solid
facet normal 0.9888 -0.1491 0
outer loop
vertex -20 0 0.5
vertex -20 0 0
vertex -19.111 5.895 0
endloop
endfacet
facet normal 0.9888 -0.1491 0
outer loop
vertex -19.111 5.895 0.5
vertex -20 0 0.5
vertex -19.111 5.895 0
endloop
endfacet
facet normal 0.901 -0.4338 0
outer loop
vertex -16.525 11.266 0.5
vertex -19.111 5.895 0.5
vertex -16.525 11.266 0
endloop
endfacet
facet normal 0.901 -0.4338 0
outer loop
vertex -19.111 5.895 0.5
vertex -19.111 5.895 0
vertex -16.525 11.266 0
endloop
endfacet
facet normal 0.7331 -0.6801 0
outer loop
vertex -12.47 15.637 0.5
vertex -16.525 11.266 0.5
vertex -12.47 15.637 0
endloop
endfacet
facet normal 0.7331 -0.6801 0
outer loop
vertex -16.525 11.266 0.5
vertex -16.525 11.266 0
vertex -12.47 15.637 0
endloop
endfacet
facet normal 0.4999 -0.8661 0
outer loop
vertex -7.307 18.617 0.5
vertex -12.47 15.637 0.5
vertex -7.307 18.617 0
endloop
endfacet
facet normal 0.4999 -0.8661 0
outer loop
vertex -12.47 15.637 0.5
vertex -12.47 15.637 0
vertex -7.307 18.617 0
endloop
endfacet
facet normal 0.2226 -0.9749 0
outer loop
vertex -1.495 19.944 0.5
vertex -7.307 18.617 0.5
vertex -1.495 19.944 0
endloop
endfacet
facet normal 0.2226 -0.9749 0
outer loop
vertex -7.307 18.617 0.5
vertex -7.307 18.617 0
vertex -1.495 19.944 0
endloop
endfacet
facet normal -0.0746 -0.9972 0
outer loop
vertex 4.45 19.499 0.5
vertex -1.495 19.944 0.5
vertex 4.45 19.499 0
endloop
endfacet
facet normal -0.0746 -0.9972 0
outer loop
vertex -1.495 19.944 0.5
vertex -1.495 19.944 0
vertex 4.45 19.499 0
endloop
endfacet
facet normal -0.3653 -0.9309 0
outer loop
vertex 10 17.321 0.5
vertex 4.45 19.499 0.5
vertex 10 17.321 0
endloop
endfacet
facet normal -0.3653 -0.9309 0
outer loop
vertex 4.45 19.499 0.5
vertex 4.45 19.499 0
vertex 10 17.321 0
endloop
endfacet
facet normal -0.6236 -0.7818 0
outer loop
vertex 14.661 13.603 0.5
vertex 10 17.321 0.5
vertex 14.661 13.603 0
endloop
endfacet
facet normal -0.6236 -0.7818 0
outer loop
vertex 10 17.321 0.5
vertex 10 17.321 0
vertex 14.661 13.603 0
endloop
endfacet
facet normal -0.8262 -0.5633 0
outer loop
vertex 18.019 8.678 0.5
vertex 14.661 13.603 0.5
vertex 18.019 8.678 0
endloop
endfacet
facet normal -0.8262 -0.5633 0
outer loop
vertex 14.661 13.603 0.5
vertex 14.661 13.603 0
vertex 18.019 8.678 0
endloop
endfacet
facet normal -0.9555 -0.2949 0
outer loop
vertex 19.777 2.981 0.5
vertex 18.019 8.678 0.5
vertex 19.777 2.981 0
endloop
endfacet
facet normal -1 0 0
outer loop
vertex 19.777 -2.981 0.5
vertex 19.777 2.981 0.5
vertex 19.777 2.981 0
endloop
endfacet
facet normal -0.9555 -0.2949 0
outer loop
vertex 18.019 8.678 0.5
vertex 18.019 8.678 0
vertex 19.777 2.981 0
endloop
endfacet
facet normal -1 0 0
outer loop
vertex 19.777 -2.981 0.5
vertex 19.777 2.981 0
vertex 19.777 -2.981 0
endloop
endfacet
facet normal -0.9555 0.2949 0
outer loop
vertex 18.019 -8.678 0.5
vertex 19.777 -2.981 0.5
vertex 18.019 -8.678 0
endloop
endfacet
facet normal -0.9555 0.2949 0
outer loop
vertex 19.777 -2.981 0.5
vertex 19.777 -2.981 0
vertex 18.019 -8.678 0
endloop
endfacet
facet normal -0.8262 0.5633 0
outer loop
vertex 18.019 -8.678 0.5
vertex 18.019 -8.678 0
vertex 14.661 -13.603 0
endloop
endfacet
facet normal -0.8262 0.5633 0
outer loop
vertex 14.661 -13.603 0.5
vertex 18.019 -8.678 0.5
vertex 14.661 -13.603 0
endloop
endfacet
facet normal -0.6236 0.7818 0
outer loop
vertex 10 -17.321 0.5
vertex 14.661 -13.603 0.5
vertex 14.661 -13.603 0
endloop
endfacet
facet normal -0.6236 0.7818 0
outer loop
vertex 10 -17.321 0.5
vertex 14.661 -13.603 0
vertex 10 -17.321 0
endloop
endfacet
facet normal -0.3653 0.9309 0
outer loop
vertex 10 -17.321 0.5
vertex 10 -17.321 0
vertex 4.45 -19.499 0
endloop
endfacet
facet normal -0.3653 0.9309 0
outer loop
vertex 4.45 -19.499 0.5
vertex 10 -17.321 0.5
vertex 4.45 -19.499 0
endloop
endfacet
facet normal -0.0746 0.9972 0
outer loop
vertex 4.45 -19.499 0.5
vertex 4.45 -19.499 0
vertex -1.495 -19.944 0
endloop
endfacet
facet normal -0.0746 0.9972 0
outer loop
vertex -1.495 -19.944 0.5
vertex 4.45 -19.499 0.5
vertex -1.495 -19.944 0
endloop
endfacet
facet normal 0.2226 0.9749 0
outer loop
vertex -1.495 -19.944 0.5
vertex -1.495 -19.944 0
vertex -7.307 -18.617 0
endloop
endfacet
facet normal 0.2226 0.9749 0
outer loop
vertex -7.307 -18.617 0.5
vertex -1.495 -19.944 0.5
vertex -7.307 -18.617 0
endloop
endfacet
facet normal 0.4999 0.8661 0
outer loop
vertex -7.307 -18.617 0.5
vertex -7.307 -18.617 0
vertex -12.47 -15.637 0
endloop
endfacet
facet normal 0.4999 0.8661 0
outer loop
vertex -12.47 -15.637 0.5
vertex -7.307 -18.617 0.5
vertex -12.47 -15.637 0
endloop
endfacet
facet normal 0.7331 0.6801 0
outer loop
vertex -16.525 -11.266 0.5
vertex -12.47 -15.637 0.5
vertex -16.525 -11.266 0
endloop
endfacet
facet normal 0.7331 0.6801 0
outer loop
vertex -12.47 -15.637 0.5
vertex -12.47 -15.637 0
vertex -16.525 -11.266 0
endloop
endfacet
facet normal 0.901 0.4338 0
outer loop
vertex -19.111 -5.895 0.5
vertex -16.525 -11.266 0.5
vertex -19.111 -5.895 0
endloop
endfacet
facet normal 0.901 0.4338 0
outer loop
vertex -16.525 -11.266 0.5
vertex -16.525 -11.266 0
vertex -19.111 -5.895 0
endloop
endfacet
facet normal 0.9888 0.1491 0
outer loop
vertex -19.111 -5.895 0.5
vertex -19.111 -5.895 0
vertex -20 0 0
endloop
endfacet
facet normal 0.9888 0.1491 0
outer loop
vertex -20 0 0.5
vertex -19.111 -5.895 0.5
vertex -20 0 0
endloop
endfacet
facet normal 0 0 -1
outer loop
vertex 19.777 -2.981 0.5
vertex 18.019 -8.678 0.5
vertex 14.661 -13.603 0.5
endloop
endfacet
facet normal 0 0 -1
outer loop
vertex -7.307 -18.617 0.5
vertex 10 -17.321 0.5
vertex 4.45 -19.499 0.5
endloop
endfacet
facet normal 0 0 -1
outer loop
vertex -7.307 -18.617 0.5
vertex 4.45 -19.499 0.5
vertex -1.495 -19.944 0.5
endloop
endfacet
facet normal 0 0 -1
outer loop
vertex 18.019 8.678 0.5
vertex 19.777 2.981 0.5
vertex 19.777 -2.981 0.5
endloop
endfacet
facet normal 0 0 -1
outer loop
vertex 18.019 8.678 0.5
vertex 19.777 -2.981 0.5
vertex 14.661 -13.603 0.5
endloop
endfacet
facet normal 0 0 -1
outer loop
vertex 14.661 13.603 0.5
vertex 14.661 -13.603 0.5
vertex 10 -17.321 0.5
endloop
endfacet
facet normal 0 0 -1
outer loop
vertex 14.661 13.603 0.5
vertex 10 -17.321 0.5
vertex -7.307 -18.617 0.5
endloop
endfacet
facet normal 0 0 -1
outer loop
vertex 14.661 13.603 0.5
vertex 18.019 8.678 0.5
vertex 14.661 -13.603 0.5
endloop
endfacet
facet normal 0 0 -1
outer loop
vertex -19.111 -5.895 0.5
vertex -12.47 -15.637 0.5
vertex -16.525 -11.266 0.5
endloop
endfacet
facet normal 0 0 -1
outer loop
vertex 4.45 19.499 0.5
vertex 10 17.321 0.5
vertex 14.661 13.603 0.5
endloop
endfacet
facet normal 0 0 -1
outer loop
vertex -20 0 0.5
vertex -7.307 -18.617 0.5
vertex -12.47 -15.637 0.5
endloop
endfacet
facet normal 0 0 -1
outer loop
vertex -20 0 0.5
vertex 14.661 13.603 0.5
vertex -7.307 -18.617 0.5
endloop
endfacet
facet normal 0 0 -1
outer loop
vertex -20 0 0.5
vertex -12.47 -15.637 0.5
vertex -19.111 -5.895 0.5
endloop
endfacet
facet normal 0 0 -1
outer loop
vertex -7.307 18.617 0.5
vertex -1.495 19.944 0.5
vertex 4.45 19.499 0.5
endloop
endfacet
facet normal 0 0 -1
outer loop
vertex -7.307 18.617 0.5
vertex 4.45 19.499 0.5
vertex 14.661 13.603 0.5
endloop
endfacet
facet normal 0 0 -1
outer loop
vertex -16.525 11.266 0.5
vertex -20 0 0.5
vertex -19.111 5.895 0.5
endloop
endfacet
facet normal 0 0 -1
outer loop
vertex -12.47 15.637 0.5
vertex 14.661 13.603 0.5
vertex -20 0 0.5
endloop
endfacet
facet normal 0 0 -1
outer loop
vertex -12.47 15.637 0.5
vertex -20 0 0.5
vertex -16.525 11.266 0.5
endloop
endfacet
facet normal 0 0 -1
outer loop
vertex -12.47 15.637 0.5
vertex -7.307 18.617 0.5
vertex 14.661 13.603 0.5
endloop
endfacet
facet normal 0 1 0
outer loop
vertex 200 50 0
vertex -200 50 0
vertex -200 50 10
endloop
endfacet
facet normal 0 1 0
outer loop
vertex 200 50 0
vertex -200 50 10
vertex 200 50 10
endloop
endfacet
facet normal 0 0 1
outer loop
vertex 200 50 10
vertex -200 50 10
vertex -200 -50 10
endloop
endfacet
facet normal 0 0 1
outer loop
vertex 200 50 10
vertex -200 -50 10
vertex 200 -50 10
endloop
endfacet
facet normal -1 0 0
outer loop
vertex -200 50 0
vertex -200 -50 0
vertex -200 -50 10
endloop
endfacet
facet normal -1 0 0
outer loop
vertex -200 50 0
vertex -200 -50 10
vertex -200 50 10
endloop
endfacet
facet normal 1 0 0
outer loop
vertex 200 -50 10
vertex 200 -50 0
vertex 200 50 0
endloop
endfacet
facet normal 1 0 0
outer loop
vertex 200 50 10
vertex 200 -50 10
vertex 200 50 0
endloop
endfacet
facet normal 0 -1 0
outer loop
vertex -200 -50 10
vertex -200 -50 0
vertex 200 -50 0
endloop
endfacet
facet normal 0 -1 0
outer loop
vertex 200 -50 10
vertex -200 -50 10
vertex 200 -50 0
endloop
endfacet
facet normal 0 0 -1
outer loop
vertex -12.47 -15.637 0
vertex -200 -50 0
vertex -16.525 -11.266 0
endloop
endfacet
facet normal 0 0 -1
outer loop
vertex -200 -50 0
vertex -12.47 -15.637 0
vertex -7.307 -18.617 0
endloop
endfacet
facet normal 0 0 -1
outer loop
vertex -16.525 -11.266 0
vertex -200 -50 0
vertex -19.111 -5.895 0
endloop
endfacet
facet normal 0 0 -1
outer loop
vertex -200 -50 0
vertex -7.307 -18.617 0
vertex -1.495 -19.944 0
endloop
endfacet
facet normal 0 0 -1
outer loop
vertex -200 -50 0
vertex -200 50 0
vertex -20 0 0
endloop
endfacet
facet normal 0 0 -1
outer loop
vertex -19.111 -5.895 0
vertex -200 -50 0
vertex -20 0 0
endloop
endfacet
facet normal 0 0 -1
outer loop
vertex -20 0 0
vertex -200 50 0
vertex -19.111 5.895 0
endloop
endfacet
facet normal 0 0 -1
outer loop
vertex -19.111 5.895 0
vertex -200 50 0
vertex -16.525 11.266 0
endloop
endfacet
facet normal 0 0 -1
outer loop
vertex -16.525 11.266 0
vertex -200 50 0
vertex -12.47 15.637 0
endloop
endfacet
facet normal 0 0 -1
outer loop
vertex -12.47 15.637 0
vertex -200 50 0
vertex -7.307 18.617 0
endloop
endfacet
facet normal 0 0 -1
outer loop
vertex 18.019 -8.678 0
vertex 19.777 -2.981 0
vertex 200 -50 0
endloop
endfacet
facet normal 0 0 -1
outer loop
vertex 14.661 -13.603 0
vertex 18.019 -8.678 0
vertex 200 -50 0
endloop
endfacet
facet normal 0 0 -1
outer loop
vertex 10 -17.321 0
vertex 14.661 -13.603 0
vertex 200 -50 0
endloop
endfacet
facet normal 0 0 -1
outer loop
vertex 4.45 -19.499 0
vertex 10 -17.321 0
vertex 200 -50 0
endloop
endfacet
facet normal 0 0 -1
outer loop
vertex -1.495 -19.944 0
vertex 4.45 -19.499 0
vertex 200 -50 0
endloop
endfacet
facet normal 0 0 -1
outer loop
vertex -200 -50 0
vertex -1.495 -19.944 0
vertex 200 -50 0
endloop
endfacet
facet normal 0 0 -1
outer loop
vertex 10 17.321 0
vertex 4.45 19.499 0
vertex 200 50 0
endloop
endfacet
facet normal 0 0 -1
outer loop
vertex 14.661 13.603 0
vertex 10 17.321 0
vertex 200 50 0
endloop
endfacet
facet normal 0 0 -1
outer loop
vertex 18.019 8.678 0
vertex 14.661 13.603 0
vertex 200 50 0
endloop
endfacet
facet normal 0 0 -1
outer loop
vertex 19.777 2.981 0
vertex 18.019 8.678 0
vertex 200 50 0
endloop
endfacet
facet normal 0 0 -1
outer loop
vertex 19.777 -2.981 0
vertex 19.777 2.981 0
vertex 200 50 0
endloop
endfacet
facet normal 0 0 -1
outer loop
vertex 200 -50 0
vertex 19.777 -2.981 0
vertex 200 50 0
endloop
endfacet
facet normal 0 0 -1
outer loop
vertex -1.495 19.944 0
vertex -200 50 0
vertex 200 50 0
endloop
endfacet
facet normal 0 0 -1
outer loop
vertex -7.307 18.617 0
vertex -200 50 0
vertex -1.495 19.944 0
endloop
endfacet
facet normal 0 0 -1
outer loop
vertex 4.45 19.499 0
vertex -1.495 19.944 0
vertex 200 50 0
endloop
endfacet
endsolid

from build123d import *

# Parameters (mm, degrees)
SKETCH1_W           = 400
SKETCH1_H           = 100
BOSS_EXTRUDE1_DEPTH = 10
SKETCH2_R           = 20
CUT_EXTRUDE1_DEPTH  = 0.5


with BuildPart() as part:
    # Sketch1 → Boss-Extrude1 (new body)
    with BuildSketch(Plane.XY):
        Rectangle(SKETCH1_W, SKETCH1_H)
    extrude(amount=BOSS_EXTRUDE1_DEPTH)

    # Sketch2 → Cut-Extrude1 (cut)
    with BuildSketch(Plane(origin=(0, 0, 0), x_dir=(-1, 0, 0), z_dir=(0, 0, -1))):
        Circle(SKETCH2_R)
    extrude(amount=-CUT_EXTRUDE1_DEPTH, mode=Mode.SUBTRACT)


solid = part.part
